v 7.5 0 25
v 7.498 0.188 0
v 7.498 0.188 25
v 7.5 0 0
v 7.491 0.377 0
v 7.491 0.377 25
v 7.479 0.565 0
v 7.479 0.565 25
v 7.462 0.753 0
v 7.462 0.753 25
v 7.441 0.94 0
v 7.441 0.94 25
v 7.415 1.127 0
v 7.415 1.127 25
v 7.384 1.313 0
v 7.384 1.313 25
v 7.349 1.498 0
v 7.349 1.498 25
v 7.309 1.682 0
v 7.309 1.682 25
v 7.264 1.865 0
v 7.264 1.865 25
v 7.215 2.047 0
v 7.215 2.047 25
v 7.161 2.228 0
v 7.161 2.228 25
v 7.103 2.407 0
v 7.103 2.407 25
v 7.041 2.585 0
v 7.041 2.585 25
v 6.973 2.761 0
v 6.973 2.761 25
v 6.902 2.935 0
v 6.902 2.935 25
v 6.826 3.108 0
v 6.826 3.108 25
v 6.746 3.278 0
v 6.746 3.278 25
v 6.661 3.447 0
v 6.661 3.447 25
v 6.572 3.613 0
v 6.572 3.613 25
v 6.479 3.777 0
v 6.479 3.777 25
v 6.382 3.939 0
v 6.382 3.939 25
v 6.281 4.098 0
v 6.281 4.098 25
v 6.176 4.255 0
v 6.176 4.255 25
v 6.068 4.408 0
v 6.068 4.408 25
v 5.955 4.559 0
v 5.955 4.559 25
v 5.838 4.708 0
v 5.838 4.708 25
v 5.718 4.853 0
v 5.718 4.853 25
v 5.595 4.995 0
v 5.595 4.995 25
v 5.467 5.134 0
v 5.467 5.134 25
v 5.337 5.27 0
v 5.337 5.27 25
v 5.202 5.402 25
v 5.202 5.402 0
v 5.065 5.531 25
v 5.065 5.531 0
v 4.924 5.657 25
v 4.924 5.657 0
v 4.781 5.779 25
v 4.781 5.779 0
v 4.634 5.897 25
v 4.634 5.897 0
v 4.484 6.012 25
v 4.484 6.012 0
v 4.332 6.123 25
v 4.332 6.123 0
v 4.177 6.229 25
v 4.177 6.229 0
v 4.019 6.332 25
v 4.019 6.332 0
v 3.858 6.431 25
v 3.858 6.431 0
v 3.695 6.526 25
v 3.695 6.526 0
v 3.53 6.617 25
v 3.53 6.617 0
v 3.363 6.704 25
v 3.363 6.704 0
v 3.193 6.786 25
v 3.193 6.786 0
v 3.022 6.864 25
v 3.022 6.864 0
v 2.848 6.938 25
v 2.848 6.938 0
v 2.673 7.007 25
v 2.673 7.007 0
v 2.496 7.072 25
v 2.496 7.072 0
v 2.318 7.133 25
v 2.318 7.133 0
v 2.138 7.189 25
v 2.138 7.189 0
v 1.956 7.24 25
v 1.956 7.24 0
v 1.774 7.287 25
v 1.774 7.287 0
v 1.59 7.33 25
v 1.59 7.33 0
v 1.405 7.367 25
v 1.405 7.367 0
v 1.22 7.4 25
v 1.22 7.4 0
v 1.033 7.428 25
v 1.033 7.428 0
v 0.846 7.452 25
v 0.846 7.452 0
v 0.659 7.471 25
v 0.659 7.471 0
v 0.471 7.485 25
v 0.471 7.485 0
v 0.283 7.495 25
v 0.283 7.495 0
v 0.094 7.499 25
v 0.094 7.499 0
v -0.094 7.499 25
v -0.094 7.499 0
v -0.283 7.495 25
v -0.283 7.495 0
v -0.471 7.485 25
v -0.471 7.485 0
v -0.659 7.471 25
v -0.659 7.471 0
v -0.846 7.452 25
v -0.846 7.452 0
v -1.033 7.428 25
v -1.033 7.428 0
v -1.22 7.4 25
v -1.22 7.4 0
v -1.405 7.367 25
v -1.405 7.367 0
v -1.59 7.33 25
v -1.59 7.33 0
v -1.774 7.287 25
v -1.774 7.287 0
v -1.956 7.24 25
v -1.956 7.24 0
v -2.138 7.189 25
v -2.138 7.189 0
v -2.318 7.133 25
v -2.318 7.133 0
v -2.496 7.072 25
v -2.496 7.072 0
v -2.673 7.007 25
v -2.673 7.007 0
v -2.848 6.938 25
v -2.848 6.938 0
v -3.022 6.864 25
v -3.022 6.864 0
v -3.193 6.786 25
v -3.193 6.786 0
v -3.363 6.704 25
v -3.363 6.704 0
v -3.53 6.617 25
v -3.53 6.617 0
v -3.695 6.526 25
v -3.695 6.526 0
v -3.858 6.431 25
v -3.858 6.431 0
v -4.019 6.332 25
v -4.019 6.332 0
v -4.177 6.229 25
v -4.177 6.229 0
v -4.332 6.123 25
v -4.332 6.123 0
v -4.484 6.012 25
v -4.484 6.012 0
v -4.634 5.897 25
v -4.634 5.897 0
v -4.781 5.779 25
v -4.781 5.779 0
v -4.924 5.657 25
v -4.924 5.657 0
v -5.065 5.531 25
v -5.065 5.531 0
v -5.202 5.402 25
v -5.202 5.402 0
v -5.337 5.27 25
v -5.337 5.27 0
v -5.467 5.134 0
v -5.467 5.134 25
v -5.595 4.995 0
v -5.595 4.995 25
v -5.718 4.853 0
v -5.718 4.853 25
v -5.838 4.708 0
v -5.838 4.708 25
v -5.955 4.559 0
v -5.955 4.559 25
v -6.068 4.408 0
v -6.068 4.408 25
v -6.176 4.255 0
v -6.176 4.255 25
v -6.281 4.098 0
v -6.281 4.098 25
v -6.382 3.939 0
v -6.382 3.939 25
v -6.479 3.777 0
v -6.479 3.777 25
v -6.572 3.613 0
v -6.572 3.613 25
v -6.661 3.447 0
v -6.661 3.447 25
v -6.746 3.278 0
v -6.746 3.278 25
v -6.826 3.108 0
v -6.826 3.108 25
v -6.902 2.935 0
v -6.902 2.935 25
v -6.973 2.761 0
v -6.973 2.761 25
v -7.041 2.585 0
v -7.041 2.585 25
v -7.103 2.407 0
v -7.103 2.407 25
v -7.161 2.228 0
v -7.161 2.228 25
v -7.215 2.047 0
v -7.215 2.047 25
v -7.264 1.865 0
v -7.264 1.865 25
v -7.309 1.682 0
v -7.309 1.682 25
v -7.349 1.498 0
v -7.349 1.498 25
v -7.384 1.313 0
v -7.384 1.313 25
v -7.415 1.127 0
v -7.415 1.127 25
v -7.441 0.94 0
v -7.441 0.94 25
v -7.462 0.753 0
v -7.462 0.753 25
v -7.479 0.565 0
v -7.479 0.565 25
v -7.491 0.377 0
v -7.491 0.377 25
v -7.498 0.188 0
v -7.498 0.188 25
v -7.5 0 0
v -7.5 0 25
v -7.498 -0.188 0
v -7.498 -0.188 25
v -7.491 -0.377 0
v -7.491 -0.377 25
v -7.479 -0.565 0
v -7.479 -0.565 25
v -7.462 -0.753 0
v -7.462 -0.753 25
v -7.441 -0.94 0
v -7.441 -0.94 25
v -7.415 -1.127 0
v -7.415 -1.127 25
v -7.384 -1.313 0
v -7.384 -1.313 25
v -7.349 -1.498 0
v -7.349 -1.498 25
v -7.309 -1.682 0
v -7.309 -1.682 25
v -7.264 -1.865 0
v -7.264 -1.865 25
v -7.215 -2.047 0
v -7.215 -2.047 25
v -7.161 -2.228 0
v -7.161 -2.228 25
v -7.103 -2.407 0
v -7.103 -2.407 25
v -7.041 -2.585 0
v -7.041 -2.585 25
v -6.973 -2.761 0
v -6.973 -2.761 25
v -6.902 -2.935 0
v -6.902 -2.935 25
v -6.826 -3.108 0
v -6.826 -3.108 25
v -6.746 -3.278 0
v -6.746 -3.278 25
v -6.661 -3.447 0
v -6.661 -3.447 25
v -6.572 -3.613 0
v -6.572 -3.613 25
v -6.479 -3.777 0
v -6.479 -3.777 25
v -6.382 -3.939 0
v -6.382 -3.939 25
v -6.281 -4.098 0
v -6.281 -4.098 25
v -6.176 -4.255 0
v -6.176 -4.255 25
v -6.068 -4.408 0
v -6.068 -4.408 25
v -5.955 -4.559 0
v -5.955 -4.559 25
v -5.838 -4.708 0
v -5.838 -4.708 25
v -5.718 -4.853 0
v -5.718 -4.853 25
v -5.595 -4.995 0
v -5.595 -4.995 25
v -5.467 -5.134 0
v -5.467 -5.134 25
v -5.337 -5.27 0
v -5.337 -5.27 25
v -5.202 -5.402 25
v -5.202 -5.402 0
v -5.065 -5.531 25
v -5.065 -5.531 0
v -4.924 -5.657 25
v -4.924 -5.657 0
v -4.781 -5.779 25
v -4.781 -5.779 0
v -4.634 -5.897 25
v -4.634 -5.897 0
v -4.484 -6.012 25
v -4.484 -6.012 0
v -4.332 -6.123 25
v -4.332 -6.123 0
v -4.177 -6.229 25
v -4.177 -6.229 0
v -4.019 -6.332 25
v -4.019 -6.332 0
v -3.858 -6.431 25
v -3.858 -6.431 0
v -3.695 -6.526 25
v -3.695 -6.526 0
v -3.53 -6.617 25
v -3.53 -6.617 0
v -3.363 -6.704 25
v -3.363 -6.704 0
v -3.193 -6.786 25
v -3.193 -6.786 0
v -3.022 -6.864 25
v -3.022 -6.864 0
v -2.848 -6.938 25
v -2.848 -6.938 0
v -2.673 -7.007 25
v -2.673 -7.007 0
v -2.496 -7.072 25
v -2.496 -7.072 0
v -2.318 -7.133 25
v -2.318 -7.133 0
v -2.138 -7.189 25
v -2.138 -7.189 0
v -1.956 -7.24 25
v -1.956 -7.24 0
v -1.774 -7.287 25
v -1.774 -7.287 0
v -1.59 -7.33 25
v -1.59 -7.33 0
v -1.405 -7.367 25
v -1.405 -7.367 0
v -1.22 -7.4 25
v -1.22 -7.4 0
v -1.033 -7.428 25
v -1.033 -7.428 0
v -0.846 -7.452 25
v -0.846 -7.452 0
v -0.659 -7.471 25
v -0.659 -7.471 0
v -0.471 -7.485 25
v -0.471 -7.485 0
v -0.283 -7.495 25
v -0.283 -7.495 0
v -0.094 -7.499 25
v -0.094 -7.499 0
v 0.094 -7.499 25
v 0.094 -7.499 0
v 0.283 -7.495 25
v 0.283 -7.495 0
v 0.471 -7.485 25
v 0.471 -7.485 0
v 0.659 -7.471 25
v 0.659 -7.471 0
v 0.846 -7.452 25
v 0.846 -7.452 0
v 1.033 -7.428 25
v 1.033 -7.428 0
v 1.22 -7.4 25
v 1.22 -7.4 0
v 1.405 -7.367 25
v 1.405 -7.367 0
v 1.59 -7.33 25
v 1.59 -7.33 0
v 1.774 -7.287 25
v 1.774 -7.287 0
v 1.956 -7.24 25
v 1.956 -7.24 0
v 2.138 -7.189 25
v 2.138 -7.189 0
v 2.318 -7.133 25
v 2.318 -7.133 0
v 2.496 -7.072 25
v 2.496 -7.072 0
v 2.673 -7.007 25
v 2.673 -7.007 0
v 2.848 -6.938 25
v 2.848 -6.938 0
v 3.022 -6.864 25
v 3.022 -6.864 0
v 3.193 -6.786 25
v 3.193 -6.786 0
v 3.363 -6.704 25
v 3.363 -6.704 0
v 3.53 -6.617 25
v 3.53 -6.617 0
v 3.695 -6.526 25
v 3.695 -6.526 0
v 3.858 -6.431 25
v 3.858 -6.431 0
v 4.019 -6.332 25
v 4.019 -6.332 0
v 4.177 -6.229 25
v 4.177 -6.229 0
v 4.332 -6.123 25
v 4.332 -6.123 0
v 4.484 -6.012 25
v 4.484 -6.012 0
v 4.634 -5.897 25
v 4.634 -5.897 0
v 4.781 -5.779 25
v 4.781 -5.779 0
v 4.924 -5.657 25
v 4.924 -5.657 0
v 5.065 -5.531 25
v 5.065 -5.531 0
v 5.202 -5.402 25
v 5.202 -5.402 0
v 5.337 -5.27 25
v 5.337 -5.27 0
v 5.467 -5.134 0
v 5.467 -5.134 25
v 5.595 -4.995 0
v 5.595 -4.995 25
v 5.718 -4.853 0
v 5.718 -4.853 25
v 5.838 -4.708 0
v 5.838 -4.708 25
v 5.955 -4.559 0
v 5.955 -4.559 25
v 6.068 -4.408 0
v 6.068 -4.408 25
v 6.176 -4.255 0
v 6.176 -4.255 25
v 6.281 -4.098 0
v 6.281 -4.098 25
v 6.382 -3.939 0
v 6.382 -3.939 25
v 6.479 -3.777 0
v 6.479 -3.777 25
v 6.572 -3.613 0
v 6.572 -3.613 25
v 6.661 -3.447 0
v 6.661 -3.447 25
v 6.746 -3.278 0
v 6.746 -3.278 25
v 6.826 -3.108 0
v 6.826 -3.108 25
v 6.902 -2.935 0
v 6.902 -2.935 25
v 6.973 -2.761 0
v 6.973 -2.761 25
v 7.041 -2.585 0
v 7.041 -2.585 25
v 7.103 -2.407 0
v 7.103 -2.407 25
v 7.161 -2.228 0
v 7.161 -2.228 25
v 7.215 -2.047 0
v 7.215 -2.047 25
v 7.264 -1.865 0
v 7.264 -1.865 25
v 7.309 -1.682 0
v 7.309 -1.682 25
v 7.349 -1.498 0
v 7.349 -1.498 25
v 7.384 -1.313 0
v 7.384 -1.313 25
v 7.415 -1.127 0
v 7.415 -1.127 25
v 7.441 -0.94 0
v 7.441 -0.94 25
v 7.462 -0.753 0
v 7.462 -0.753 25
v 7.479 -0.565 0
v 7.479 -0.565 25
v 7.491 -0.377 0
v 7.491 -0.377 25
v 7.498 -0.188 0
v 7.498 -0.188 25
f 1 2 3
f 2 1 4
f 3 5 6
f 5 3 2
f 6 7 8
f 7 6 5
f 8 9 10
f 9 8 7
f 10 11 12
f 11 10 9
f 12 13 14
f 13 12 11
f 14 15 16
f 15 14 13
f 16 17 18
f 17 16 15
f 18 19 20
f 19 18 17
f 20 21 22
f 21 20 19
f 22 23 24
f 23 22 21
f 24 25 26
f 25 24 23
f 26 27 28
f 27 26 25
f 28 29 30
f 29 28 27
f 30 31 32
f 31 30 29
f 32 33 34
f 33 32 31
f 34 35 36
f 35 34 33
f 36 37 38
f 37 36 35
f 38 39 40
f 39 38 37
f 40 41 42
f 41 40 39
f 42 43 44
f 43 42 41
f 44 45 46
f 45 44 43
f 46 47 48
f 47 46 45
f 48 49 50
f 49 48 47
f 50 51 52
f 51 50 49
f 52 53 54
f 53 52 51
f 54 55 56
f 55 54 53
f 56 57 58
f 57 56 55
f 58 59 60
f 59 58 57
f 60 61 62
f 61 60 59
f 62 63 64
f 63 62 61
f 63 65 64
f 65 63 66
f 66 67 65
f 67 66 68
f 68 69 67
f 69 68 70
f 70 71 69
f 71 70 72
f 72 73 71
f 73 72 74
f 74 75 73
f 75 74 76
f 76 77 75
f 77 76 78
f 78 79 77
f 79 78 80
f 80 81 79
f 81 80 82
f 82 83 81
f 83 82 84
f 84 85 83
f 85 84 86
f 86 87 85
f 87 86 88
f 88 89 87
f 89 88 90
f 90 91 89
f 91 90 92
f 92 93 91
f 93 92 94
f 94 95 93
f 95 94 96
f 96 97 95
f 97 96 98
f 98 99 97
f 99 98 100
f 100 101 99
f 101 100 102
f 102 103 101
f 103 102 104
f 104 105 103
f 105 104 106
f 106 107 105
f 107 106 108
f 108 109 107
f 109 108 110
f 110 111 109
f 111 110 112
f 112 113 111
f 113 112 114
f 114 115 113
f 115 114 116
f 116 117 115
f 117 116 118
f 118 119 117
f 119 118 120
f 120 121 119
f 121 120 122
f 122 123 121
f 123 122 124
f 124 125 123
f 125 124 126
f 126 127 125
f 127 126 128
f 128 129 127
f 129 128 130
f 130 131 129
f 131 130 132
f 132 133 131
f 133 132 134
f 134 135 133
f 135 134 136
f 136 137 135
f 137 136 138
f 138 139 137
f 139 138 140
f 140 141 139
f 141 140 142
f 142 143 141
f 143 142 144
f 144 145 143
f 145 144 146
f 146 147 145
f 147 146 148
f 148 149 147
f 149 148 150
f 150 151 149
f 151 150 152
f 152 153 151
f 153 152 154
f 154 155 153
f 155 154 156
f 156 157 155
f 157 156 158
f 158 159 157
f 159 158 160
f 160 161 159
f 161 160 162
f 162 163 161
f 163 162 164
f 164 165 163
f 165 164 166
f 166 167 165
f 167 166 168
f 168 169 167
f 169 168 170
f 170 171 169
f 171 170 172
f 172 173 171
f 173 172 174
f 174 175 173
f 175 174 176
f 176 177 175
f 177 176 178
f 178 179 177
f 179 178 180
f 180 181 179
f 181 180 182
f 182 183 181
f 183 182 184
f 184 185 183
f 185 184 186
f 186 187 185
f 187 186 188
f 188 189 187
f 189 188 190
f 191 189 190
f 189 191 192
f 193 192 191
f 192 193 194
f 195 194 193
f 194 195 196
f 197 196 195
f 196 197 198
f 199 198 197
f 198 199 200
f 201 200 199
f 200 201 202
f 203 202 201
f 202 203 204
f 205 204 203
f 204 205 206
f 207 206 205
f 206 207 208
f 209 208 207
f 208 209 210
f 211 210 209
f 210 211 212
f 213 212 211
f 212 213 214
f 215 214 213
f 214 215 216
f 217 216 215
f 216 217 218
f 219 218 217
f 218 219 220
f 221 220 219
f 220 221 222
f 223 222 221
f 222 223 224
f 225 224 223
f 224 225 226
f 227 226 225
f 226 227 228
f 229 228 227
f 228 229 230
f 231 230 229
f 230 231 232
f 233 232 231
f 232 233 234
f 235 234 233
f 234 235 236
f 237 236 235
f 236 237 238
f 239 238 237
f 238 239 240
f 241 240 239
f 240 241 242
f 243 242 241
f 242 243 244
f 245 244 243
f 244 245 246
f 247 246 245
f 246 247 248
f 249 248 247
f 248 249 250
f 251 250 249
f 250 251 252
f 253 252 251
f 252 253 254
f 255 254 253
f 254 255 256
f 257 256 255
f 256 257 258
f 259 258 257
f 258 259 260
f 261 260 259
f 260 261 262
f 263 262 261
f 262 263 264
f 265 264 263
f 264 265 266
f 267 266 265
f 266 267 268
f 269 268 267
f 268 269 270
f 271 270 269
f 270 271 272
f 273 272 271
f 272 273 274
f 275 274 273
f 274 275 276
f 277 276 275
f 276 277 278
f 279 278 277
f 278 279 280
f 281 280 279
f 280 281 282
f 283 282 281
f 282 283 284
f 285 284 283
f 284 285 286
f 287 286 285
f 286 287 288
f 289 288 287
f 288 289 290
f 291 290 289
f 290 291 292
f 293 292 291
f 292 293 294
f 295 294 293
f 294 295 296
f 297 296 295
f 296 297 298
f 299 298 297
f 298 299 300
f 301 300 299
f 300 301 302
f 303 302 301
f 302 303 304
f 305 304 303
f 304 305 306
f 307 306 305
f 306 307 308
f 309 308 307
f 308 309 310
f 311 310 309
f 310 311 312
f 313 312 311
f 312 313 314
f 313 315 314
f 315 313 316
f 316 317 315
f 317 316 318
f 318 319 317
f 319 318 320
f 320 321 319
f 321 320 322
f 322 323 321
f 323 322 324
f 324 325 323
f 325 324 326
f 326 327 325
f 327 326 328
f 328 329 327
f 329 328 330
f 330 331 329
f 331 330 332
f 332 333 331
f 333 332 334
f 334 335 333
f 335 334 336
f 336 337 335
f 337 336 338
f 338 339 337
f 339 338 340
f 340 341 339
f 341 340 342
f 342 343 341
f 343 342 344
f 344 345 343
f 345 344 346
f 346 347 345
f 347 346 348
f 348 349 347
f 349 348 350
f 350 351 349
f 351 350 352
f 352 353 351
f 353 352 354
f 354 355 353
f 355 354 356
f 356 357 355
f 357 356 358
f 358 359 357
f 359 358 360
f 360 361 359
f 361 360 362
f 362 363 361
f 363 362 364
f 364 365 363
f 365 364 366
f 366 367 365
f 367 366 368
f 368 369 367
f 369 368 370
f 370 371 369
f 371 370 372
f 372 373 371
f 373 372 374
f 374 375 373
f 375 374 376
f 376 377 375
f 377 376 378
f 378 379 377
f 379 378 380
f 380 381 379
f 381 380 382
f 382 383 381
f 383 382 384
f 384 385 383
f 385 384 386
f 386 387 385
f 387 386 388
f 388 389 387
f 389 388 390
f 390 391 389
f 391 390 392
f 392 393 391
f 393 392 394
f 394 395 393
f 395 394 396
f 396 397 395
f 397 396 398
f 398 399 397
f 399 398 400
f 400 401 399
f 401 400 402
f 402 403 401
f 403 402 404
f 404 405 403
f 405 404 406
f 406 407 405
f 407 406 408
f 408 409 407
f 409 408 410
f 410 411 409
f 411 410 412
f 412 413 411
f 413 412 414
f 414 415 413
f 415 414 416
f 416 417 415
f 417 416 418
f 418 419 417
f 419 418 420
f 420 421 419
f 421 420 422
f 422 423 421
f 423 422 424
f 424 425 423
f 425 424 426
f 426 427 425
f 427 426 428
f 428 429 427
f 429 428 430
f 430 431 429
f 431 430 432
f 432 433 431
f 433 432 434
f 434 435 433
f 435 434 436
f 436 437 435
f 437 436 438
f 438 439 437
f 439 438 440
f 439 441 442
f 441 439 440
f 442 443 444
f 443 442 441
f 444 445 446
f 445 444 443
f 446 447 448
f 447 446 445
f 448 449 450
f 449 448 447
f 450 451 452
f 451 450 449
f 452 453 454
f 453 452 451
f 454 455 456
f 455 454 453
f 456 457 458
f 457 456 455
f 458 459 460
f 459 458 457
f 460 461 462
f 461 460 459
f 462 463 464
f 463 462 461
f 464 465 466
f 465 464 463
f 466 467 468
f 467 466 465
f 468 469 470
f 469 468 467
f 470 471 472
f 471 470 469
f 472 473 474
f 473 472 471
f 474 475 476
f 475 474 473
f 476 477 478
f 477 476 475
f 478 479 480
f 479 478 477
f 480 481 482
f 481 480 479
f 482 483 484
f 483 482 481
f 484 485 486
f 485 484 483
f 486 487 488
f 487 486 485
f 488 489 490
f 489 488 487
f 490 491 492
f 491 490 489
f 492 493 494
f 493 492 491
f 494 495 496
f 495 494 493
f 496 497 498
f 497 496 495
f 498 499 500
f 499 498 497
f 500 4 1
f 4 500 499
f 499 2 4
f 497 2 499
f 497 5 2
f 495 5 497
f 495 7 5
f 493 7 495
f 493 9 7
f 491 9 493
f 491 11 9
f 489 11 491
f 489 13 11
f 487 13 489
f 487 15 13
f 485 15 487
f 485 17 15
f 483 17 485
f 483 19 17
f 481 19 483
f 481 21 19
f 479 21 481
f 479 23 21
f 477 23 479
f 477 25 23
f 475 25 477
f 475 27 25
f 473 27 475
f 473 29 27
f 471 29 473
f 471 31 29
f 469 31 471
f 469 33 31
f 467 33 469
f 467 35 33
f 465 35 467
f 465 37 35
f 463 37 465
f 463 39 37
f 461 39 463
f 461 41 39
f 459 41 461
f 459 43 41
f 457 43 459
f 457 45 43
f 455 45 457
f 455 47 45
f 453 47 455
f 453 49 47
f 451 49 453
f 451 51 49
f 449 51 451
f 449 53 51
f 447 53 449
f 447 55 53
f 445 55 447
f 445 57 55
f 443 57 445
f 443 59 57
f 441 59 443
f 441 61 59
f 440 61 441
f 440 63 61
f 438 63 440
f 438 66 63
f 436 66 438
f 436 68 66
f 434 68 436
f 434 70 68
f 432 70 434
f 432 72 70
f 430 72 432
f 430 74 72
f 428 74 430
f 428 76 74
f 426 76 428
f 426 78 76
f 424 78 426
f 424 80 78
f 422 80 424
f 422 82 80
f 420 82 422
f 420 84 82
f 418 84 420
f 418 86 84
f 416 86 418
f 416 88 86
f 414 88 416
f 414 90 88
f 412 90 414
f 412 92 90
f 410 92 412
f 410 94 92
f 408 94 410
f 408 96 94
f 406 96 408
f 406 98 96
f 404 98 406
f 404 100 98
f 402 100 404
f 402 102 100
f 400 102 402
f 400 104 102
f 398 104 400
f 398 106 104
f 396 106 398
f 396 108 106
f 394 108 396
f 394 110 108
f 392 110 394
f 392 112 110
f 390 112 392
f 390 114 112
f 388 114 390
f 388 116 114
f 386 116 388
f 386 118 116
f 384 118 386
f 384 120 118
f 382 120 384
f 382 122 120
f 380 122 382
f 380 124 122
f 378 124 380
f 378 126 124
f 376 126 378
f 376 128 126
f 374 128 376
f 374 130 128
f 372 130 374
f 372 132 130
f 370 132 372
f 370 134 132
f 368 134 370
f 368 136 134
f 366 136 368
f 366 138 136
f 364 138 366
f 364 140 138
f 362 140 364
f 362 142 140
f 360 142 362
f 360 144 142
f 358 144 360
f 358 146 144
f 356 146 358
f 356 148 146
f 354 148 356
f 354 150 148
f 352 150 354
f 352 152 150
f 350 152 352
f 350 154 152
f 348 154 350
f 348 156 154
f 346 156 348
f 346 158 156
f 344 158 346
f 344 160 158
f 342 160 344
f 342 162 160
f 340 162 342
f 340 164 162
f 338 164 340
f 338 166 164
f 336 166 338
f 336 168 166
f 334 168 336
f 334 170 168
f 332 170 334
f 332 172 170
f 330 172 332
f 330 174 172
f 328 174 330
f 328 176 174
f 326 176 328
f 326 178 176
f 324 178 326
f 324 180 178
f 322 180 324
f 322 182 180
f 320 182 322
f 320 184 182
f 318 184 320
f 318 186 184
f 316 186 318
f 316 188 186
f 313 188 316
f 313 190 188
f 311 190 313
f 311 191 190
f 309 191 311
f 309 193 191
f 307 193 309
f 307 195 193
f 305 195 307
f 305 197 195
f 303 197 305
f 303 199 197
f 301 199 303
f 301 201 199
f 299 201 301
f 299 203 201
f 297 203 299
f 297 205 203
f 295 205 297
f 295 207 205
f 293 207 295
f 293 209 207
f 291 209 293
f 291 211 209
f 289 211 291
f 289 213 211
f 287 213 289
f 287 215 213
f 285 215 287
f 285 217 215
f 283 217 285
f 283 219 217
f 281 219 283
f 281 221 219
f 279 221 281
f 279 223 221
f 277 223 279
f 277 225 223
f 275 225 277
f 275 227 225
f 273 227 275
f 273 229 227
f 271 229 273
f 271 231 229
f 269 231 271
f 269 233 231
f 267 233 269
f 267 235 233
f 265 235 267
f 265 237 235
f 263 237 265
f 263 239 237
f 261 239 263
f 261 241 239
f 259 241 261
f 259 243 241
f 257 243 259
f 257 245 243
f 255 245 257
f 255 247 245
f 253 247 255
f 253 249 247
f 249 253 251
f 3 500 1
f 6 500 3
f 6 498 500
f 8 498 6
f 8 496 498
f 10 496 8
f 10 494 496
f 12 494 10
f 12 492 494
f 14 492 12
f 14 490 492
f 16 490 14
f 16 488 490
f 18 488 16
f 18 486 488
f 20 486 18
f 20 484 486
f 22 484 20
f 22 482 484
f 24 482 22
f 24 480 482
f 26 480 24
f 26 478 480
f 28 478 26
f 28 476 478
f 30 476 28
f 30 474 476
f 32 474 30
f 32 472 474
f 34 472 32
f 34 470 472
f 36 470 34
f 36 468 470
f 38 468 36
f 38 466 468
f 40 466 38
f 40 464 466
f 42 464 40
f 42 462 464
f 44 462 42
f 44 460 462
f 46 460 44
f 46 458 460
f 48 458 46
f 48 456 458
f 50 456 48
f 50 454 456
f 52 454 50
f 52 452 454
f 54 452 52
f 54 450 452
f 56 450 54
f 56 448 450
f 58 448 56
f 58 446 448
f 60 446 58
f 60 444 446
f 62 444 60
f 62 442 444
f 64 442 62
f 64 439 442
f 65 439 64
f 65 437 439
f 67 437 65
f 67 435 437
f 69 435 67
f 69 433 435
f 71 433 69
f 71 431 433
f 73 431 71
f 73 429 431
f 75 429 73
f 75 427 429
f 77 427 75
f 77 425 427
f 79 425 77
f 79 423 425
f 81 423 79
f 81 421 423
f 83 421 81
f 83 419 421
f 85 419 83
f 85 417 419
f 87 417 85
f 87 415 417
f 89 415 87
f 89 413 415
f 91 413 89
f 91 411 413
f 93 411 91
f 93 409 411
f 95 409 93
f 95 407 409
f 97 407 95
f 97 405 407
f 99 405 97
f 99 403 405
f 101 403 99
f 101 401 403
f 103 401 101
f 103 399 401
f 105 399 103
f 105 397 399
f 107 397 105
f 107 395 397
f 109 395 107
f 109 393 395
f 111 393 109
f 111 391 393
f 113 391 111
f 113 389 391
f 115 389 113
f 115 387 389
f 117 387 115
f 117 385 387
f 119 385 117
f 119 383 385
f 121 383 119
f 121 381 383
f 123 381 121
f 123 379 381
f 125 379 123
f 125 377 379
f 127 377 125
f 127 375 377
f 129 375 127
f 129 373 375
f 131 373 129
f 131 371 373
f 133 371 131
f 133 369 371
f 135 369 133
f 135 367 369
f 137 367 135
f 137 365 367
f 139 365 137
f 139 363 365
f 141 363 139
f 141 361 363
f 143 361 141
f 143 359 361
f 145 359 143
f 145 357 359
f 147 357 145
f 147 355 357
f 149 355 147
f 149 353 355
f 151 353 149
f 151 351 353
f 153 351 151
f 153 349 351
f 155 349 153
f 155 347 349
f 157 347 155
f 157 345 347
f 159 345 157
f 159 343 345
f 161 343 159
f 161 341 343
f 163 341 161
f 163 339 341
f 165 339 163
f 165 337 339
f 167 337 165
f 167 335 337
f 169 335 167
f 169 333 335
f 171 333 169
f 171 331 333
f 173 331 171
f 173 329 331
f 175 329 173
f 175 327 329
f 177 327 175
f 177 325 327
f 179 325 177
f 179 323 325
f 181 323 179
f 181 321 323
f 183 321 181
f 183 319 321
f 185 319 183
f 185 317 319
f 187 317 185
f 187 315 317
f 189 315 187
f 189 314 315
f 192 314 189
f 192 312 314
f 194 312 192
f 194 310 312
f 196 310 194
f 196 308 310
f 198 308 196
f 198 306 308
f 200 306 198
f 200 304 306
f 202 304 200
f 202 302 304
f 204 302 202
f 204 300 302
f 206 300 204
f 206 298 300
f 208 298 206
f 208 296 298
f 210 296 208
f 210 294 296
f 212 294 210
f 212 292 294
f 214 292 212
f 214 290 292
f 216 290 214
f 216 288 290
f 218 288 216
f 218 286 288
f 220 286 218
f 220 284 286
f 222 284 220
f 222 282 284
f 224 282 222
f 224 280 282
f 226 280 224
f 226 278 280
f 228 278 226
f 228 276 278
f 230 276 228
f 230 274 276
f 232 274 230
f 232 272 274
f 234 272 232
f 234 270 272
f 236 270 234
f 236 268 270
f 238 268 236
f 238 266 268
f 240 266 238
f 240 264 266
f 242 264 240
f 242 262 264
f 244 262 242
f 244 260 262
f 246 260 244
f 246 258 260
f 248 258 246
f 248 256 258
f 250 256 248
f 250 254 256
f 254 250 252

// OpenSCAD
//
// Stamp
// Copyright (C) 2022 Nils Weber
//
// Licensed under CC BY-NC-SA 4.0
//

////////////////////////////////////////////////////////////////////////////////

/* [Stamp Handle] */

// The shape of the stamp/handle
Stamp_Shape = "Cylindrical"; // [Cylindrical, Rectangular]

// Height of the stamp handle
Stamp_Height = 25;

/* [Stamp Stencil] */

// Diameter of the stamp
Stamp_Diameter = 15;

// Diameter of the stamp on the secondary axis (only used for rectangular stamps)
Stamp_Diameter_Secondary = 15;

// SVG file of the stencil design
Stencil_SVG = "";

// Invert stencil design
Invert_Stencil = false;

// Thickness of the stencil
Stencil_Thickness = 1;

// Thickness of the border drawn around the stencil (0 to deactivate)
Stencil_Border = 0;

// Size by with to shrink the stencil design (useful to adjust padding to border)
Stencil_Inset = 0;

/* [Hidden] */

$fn = 250;

size_x = Stamp_Diameter;
size_y = Stamp_Shape == "Cylindrical" ? Stamp_Diameter : Stamp_Diameter_Secondary;

////////////////////////////////////////////////////////////////////////////////

module base() {
	// Select stamp handle shape
	if (Stamp_Shape == "Cylindrical") {
		cylinder(h=Stamp_Height, d=Stamp_Diameter);
	} else if (Stamp_Shape == "Rectangular") {
		translate([-size_x/2, -size_y/2, 0])
		cube([size_x, size_y, Stamp_Height]);
	}
}

module stencil_inverted() {
	difference() {
		// Stencil base
		if (Stamp_Shape == "Cylindrical") {
			cylinder(h=Stencil_Thickness, d=size_x);
		} else if (Stamp_Shape == "Rectangular") {
			translate([-size_x/2, -size_y/2, 0])
			cube([size_x, size_y, Stencil_Thickness]);
		}

		// Stencil border
	if (Stencil_Border > 0) {
		if (Stamp_Shape == "Cylindrical") {
			translate([0, 0, -0.5]) // fix artifacts
			difference() {
				cylinder(h=Stencil_Thickness+1, d=Stamp_Diameter - Stencil_Border);
				cylinder(h=Stencil_Thickness+1, d=Stamp_Diameter - Stencil_Border*2);
			}
		} else if (Stamp_Shape == "Rectangular") {
			translate([-size_x/2, -size_y/2, 0])
			difference() {
				translate([Stencil_Border/2, Stencil_Border/2, -0.5])
				cube([size_x - Stencil_Border, size_y - Stencil_Border, Stencil_Thickness+1]);

				translate([Stencil_Border, Stencil_Border, -0.5])
				cube([size_x - Stencil_Border*2, size_y - Stencil_Border*2, Stencil_Thickness+1]);
			}
		}
	}

		// Stencil design
	if (Stencil_SVG != "") {
			translate([0, 0, -0.5]) // fix artifacts
			linear_extrude(Stencil_Thickness+1)
			resize([size_x - Stencil_Border*3 - Stencil_Inset, 0, 0], auto=true)
			mirror([1, 0, 0])
			import(Stencil_SVG, center=true);
		}
	}
}

module stencil_regular() {
	// Stencil border
	if (Stencil_Border > 0) {
		if (Stamp_Shape == "Cylindrical") {
			difference() {
				cylinder(h=Stencil_Thickness, d=Stamp_Diameter);
				translate([0, 0, -0.5]) // fix artifacts
				cylinder(h=Stencil_Thickness+1, d=Stamp_Diameter - Stencil_Border);
			}
		} else if (Stamp_Shape == "Rectangular") {
			translate([-size_x/2, -size_y/2, 0])
			difference() {
				cube([size_x, size_y, Stencil_Thickness]);

				translate([Stencil_Border/2, Stencil_Border/2, -0.5])
				cube([size_x - Stencil_Border, size_y - Stencil_Border, Stencil_Thickness+1]);
			}
		}
	}

	// Stencil Design
	if (Stencil_SVG != "") {
		linear_extrude(Stencil_Thickness)
		resize([size_x - Stencil_Border*2 - Stencil_Inset, 0, 0], auto=true)
		mirror([1, 0, 0])
		import(Stencil_SVG, center=true);
	}
}

////////////////////////////////////////////////////////////////////////////////

base();

translate([0, 0, Stamp_Height])
if (Invert_Stencil) {
	stencil_inverted();
} else {
	stencil_regular();
}
